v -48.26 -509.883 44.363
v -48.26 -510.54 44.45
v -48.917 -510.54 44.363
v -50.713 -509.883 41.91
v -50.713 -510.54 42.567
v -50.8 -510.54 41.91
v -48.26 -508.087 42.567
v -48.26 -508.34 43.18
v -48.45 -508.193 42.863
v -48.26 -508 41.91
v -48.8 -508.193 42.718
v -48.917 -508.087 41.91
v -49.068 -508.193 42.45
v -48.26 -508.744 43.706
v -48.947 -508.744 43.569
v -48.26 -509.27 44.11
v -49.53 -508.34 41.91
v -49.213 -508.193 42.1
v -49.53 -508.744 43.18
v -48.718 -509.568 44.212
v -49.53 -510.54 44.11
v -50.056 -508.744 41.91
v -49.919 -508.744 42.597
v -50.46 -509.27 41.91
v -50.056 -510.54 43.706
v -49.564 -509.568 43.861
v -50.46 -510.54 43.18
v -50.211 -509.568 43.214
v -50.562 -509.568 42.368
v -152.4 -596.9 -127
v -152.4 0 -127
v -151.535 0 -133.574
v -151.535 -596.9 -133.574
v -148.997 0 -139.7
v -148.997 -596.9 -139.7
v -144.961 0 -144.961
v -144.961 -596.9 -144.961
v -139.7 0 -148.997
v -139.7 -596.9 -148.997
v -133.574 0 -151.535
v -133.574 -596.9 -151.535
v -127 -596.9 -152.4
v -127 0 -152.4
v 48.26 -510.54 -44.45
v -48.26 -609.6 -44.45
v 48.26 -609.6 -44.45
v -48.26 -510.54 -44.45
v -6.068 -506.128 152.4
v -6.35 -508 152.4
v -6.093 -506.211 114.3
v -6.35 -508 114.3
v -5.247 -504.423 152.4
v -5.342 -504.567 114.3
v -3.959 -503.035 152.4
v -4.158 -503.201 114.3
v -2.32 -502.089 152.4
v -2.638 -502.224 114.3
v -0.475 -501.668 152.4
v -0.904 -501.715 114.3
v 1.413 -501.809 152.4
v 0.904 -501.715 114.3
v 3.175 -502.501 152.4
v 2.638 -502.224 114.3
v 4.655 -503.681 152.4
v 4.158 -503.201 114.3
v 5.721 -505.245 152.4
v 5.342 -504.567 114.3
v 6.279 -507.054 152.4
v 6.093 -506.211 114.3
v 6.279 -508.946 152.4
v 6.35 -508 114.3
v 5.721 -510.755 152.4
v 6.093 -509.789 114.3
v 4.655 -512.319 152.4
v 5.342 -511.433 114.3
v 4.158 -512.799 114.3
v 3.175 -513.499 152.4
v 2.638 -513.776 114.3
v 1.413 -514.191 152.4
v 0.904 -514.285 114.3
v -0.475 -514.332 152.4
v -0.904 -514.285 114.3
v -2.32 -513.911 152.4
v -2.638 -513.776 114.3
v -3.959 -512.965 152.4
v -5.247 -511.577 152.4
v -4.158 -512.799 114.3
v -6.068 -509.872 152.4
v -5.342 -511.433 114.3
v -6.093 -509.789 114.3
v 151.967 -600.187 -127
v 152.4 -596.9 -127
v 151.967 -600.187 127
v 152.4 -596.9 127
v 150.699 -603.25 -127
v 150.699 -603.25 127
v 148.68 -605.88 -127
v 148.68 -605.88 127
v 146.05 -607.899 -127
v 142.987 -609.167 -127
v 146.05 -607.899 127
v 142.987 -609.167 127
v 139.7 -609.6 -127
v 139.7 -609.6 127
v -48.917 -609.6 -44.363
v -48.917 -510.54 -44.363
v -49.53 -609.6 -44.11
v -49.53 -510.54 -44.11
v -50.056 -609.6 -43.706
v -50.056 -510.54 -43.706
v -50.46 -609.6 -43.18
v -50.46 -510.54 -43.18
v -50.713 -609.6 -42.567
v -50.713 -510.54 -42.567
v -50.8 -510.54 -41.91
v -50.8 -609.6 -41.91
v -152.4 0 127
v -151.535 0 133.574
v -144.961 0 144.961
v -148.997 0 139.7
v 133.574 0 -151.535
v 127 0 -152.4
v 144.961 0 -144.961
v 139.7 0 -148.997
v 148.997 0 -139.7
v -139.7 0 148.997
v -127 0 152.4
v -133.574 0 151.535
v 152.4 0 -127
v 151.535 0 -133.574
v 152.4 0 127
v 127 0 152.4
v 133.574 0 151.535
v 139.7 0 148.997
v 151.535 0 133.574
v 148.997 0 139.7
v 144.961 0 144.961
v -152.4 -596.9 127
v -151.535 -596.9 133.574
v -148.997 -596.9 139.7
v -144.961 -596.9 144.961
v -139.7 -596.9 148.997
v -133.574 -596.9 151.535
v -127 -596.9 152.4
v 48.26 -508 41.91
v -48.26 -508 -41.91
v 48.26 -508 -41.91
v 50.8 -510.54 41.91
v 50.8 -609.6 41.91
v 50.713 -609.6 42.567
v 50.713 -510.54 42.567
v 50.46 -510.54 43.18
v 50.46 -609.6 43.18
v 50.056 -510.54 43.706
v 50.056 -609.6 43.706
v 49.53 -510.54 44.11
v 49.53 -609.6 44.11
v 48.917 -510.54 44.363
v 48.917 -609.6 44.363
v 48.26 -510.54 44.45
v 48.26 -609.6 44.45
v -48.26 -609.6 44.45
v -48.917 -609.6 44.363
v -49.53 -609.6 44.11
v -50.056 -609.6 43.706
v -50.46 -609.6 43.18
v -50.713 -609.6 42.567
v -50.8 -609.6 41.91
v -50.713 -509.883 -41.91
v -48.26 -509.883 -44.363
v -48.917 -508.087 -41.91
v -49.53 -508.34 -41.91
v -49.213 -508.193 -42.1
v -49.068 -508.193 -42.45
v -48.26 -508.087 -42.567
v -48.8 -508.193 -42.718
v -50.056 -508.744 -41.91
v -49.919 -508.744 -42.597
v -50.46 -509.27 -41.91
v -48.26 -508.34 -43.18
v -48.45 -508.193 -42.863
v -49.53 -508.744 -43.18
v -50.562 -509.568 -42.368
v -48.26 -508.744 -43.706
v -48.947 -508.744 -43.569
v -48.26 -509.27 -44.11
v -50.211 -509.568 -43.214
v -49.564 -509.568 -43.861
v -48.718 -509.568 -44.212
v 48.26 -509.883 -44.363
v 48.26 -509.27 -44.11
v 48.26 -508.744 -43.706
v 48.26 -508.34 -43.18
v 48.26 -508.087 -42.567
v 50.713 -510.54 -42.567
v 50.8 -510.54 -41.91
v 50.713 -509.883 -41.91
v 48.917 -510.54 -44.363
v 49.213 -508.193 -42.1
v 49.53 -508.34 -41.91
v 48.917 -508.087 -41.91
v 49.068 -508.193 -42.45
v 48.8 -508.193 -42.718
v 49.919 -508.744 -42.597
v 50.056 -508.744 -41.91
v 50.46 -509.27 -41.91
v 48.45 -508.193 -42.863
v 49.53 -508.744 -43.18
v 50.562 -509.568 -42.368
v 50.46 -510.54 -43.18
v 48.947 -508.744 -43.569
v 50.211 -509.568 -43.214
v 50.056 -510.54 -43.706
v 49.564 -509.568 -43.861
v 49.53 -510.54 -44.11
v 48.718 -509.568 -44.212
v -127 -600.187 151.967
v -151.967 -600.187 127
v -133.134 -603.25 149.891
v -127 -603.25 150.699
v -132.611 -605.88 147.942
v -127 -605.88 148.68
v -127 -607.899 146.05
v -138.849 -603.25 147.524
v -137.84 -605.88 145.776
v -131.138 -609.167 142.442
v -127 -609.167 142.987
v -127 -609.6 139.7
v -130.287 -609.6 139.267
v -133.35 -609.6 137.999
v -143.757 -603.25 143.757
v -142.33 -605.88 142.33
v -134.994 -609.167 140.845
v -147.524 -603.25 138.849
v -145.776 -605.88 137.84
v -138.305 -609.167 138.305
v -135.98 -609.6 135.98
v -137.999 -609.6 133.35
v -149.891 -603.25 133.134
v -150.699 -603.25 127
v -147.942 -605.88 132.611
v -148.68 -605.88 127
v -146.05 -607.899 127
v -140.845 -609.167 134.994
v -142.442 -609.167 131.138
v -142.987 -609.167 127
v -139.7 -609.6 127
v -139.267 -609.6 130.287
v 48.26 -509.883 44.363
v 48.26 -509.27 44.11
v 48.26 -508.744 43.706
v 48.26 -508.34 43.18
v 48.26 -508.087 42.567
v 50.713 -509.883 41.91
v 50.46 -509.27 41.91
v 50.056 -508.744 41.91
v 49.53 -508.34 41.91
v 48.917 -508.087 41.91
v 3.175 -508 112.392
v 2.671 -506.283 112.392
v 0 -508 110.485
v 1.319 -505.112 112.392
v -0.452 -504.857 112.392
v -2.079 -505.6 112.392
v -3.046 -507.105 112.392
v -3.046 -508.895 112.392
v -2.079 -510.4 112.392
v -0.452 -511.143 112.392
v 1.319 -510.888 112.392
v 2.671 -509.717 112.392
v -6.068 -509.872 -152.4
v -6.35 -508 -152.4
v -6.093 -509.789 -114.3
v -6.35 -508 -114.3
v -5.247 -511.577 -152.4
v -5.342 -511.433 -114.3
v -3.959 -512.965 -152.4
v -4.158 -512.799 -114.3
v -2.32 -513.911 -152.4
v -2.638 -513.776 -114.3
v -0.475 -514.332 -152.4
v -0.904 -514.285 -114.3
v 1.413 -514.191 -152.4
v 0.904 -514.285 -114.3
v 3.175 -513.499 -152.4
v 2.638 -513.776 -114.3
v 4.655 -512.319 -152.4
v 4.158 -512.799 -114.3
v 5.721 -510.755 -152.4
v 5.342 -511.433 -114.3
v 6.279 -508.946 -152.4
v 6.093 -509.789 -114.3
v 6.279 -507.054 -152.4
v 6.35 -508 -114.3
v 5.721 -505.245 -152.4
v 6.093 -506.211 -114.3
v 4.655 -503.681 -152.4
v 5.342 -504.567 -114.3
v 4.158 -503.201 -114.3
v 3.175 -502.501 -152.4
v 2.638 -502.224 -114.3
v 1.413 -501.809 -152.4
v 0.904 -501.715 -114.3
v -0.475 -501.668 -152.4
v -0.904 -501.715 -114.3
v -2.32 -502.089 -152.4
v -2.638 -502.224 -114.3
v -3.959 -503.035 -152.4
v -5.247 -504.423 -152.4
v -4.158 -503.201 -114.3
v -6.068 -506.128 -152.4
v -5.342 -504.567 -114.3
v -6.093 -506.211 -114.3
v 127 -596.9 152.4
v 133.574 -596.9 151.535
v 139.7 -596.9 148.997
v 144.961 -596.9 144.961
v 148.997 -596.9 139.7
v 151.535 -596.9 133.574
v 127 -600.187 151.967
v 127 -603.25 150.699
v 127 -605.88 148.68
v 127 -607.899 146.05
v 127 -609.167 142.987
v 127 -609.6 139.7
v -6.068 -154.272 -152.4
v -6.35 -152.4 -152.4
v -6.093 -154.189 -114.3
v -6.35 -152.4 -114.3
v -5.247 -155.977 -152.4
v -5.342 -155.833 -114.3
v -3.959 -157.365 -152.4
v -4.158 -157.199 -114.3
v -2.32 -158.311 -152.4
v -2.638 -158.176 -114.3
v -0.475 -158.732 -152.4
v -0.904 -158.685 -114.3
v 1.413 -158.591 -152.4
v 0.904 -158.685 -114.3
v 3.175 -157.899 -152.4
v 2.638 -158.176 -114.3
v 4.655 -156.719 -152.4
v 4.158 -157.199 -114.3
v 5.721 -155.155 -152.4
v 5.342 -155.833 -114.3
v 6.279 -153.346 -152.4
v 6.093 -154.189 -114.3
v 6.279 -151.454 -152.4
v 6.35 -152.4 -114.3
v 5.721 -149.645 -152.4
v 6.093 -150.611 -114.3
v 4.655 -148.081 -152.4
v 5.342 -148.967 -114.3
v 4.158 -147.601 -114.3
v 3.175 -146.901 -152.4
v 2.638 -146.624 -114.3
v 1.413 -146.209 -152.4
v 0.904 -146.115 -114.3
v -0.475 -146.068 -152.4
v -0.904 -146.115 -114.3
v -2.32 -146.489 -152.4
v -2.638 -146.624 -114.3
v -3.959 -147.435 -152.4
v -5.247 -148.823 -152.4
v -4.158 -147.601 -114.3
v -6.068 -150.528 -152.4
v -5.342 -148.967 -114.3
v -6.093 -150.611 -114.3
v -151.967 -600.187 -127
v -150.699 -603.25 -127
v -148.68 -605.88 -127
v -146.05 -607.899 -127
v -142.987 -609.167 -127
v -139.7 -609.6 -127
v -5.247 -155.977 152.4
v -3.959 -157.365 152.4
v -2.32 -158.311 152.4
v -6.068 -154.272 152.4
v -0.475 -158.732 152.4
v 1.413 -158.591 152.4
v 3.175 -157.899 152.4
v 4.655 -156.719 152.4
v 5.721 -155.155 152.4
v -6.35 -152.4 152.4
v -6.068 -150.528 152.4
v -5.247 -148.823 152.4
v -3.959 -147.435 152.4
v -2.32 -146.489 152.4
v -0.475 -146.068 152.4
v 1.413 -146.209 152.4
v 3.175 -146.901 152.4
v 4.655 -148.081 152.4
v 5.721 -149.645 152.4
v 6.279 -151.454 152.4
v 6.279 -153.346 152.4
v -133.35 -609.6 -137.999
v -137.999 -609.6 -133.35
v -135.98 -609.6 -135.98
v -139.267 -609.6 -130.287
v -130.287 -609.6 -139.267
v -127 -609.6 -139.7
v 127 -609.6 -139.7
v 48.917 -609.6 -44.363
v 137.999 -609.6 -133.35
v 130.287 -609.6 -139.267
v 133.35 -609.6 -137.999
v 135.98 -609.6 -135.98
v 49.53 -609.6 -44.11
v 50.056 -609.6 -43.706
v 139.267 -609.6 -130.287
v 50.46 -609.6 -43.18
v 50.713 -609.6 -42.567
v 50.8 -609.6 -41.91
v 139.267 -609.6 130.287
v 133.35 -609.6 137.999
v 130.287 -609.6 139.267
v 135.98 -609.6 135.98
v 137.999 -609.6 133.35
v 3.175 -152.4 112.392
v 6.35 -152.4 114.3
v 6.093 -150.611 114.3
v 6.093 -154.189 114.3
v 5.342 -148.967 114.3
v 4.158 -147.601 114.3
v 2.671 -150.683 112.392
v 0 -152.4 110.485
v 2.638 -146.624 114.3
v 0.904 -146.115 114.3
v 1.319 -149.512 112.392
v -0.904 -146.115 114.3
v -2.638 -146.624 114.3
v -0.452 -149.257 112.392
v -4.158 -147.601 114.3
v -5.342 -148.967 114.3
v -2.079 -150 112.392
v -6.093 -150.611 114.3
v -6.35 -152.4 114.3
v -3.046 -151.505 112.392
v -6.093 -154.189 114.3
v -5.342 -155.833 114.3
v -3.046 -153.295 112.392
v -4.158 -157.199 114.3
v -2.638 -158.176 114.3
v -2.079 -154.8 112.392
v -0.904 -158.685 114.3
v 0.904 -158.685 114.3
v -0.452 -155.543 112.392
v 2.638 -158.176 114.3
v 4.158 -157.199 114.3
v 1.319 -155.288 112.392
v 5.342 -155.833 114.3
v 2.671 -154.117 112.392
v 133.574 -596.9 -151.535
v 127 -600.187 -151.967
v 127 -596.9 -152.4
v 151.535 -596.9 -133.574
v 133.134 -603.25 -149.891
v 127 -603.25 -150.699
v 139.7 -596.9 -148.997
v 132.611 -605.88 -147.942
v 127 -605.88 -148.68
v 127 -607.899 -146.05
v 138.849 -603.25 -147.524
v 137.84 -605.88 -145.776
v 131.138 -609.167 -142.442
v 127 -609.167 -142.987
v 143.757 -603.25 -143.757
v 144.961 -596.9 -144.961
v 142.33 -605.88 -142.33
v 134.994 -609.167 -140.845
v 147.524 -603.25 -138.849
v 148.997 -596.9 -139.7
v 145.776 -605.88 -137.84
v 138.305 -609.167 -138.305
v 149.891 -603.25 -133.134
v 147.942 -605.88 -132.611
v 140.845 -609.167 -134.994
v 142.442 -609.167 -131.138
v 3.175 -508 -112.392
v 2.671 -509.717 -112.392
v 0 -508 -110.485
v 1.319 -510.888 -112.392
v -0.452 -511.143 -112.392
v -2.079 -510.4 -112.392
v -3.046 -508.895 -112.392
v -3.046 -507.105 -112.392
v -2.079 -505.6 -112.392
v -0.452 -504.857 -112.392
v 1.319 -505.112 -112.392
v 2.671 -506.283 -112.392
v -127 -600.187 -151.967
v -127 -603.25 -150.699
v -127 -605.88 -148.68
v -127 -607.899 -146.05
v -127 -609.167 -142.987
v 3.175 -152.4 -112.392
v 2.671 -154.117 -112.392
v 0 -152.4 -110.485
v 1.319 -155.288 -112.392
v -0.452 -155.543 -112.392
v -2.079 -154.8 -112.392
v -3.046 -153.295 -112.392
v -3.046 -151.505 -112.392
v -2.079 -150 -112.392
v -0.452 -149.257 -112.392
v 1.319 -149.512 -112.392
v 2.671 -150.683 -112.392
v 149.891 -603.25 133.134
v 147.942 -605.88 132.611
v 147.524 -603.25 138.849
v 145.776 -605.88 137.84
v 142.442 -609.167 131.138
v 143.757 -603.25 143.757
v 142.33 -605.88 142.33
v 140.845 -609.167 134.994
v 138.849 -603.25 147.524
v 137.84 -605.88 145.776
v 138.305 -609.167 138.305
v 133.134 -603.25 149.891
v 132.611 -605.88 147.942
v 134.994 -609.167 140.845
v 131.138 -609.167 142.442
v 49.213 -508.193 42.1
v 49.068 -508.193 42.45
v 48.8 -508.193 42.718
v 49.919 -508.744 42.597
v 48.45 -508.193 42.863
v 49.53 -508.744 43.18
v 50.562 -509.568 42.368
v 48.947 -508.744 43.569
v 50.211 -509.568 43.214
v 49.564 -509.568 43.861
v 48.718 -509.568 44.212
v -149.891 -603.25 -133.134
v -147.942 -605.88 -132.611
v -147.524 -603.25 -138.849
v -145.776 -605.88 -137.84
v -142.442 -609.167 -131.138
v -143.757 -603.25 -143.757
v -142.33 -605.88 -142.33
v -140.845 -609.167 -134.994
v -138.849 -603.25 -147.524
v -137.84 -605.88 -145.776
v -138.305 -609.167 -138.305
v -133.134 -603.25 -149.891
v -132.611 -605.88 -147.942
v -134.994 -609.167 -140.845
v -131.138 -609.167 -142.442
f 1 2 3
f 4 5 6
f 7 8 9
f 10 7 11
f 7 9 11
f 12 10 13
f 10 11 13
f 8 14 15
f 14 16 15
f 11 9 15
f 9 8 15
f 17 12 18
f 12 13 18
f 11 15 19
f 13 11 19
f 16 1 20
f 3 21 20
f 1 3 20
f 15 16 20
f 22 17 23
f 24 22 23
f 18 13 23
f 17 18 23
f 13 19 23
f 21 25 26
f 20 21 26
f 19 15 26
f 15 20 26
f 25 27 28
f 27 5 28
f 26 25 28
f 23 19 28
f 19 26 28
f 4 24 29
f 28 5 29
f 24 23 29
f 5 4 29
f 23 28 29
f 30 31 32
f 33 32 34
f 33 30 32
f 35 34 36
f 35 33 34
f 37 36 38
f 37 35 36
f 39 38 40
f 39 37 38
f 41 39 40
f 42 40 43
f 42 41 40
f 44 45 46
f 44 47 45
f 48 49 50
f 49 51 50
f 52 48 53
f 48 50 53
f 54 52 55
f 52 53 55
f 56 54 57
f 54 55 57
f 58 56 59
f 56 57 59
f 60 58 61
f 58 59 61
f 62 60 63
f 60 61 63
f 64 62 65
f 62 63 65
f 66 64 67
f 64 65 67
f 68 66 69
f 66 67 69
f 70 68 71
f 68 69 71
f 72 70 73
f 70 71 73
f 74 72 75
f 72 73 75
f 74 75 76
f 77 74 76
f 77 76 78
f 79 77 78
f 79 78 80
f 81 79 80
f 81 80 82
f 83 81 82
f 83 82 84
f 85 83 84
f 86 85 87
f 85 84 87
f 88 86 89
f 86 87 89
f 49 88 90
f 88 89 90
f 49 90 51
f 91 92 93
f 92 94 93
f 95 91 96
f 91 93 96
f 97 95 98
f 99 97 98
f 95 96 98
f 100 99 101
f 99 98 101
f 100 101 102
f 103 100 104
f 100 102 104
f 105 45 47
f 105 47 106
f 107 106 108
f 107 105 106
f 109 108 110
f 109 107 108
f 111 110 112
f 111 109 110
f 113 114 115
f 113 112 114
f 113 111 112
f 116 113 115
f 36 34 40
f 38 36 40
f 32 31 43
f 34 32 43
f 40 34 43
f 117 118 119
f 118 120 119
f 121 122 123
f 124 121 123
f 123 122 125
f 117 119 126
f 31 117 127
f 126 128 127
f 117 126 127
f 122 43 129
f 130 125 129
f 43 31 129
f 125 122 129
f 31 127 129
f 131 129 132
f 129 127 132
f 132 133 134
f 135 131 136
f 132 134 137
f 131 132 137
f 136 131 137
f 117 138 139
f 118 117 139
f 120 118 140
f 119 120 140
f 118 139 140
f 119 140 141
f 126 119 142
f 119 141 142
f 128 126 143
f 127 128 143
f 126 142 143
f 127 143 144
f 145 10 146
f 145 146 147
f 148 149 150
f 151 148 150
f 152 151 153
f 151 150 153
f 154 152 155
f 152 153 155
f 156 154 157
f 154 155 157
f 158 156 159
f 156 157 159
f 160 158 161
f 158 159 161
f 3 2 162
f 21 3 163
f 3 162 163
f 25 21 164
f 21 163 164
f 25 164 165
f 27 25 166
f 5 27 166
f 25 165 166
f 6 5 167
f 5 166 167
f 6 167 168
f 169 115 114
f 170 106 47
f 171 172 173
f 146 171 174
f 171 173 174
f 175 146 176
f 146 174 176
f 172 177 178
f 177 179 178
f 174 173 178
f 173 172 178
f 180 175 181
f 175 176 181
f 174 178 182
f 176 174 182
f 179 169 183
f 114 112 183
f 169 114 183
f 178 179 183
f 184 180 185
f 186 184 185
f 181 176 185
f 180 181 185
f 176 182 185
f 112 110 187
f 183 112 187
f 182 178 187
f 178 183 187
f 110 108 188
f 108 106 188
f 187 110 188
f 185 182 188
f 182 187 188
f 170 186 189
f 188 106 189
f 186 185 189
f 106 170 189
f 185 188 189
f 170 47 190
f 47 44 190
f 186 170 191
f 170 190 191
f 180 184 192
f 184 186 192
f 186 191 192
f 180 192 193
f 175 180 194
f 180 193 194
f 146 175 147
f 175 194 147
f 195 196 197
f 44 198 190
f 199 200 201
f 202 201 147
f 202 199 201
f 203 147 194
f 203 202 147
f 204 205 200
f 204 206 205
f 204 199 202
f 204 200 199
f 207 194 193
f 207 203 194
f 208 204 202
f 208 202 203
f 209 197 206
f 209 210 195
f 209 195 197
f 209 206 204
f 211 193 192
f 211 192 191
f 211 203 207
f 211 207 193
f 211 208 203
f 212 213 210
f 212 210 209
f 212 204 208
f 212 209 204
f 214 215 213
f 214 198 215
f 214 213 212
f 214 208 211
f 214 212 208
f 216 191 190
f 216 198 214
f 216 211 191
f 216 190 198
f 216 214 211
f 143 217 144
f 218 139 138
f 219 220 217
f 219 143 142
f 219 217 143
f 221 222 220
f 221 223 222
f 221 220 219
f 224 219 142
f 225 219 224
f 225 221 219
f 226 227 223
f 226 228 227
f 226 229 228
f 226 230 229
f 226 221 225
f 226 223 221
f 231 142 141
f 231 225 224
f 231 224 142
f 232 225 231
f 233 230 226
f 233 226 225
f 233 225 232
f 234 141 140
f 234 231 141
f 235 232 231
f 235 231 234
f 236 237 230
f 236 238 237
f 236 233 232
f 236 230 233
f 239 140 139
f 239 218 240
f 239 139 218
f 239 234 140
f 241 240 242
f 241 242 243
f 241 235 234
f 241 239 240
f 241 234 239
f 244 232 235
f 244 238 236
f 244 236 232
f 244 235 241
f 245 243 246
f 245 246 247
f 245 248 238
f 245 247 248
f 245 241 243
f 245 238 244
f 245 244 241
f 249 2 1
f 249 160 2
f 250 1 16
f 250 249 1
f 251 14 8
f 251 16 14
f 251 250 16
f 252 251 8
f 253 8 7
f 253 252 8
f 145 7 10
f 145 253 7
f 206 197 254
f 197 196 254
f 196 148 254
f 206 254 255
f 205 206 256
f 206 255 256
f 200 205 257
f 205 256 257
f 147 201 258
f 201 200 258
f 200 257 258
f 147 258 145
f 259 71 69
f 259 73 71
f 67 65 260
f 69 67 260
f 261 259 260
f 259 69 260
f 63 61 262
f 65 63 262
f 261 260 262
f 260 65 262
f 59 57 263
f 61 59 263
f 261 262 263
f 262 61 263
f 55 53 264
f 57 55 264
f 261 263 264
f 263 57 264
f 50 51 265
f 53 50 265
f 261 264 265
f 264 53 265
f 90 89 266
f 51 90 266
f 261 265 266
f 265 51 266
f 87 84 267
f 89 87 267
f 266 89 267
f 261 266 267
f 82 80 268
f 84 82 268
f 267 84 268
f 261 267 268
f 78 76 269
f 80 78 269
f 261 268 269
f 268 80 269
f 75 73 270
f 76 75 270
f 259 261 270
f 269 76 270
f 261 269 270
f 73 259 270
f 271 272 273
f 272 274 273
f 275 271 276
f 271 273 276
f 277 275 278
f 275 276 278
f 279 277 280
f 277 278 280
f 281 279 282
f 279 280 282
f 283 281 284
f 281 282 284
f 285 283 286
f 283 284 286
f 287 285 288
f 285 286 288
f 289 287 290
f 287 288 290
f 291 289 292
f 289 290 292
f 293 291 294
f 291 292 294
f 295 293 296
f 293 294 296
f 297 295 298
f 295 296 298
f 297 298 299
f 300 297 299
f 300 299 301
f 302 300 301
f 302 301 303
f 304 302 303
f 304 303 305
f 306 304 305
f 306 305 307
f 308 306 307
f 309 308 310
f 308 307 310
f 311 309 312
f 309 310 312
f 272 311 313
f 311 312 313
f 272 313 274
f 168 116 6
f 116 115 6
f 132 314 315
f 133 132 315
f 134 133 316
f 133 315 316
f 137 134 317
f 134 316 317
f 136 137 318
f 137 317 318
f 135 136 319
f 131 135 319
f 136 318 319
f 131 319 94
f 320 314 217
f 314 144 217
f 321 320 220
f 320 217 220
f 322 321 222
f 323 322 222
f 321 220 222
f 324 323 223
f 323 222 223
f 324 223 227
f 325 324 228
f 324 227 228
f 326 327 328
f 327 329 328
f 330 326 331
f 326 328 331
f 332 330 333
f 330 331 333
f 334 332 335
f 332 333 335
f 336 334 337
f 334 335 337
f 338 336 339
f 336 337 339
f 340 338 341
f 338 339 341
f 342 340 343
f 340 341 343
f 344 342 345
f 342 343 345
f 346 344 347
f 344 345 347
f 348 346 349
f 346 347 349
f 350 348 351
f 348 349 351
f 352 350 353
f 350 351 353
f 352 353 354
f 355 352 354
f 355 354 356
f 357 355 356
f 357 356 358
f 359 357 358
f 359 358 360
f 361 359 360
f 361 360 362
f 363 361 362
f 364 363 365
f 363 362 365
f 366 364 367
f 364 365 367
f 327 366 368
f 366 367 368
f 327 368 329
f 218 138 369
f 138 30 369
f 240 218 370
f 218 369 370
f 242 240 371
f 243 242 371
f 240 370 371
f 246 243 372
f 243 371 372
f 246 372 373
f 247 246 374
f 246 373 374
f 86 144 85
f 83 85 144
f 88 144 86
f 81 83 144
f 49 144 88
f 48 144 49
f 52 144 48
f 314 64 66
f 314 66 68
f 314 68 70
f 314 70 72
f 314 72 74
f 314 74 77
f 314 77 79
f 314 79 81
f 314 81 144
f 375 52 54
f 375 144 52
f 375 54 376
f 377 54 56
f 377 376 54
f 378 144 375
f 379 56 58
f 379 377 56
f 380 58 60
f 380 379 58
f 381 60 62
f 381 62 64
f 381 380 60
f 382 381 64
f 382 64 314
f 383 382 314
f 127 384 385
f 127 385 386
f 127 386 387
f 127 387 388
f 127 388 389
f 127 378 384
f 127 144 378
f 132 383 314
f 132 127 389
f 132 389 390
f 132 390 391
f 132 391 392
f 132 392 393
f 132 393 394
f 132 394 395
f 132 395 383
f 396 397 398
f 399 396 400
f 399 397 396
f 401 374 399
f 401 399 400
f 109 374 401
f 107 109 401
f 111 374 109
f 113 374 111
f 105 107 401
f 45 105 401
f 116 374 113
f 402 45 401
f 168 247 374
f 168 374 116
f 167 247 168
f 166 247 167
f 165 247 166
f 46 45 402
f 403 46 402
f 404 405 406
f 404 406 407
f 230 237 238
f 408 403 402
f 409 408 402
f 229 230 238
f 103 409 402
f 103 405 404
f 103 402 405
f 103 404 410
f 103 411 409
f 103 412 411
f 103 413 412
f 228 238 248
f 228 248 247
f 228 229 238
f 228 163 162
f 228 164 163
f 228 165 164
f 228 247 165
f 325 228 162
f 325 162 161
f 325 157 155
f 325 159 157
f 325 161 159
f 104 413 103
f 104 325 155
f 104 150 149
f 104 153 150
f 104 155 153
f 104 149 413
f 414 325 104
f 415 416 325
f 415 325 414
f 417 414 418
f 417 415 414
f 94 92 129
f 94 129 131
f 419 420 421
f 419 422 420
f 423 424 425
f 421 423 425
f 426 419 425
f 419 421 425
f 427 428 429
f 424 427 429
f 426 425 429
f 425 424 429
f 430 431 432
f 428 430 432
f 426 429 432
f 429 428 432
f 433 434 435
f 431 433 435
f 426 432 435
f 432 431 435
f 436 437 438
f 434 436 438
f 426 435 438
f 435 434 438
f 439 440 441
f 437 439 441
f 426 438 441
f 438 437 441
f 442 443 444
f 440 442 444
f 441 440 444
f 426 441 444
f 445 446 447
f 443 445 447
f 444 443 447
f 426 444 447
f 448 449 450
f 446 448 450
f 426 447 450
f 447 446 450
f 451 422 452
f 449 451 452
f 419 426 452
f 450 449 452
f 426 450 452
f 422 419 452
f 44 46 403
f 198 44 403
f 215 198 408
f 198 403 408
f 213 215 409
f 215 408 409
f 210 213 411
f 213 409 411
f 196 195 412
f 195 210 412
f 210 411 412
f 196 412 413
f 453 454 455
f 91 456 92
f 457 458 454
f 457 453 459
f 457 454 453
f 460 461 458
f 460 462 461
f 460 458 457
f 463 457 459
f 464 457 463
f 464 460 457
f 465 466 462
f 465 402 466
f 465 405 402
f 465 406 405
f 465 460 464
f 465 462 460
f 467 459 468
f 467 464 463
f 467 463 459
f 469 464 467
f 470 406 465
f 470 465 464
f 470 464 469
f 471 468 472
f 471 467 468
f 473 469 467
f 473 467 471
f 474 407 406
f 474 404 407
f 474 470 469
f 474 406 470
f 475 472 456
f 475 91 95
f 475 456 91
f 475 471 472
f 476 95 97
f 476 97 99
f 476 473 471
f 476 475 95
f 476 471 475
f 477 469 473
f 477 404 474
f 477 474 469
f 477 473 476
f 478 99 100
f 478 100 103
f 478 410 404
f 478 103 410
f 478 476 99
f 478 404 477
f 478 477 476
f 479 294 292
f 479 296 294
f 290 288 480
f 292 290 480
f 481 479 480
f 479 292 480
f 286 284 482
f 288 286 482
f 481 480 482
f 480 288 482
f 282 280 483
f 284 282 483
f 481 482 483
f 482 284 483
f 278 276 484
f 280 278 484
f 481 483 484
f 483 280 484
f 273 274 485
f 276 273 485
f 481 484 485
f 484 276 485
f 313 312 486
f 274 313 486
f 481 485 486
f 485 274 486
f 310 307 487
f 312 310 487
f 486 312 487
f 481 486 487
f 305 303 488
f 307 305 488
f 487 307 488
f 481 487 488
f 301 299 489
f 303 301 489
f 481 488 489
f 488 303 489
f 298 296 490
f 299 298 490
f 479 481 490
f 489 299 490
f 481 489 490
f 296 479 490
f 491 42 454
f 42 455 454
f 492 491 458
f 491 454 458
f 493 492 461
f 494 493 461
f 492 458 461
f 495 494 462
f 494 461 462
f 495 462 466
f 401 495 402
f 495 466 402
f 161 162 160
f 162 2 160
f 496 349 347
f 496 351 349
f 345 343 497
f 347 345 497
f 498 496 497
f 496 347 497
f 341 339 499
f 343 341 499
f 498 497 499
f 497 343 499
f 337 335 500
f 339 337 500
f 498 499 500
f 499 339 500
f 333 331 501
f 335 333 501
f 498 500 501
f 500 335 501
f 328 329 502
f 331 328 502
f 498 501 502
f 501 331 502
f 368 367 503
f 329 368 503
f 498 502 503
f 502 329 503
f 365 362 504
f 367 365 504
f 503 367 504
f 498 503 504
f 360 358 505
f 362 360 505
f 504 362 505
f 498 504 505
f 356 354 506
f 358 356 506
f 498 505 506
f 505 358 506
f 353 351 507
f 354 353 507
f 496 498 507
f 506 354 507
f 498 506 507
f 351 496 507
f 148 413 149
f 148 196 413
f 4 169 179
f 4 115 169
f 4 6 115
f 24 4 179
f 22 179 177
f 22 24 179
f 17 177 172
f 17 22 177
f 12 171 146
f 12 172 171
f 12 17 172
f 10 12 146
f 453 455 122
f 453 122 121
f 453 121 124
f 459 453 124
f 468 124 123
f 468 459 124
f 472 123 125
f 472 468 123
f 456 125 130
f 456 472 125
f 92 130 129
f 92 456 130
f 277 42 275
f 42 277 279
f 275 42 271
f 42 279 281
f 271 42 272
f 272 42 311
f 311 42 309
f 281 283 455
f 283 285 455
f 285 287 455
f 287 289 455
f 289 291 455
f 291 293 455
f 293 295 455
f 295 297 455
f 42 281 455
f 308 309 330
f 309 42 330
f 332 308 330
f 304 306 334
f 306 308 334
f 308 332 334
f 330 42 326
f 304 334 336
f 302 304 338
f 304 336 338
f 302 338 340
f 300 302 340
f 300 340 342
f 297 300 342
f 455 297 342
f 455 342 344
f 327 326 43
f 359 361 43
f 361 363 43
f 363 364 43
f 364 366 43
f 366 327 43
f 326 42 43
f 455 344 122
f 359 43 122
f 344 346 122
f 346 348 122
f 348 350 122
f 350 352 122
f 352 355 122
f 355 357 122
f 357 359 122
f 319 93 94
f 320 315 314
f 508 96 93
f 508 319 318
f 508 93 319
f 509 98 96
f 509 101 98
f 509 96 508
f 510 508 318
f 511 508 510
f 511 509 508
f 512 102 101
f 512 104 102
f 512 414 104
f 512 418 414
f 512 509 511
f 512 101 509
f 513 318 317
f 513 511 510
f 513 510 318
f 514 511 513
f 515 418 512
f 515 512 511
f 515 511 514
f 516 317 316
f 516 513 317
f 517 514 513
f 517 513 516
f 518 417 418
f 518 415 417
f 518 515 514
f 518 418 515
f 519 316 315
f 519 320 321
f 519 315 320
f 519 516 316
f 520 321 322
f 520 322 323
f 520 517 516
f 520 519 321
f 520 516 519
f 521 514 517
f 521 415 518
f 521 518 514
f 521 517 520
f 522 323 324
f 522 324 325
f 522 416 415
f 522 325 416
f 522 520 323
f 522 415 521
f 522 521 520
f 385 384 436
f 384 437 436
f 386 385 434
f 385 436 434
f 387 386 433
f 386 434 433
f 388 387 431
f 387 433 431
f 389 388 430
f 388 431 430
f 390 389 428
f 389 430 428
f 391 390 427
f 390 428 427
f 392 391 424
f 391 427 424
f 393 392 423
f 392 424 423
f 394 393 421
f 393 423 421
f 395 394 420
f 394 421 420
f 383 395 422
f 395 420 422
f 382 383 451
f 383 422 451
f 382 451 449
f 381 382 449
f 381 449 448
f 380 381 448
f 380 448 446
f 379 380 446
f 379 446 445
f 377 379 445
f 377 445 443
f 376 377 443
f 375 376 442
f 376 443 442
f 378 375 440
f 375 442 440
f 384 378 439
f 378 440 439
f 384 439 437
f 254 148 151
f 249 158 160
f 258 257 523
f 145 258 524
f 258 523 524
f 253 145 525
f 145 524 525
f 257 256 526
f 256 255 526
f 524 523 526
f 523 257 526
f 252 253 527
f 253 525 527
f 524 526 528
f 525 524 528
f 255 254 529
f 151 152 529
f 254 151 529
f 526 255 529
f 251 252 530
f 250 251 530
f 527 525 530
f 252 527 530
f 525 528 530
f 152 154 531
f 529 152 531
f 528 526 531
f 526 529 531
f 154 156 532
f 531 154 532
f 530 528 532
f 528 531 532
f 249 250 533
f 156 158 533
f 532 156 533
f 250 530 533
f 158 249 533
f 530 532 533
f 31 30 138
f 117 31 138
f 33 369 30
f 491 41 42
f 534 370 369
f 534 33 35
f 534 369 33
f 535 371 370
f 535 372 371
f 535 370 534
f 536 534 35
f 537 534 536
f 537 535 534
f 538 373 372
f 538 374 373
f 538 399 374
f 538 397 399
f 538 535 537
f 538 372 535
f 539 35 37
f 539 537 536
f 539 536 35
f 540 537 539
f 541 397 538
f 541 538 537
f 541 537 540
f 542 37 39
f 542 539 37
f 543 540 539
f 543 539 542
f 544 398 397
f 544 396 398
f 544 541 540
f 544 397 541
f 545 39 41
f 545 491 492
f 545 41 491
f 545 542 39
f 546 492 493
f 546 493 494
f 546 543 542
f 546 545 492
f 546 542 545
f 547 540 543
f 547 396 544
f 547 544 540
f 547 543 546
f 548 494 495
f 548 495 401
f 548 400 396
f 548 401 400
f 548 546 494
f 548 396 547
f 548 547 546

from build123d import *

# Parameters (mm, degrees)
F0_W     = 304.8
F0_H     = 304.8
F0_W_2   = 101.6
F0_H_2   = 88.9
F1_DEPTH = 609.6
F8_DEPTH = 508
F2_R     = 25.4
F3_R     = 12.7
F4_D     = 12.7
F4_DEPTH = 38.1
F4_TIP   = 3.8154649308
F6_D     = 12.7
F6_DEPTH = 38.1
F6_TIP   = 3.8154649308
F7_R     = 2.54


# Not quite as in the source:
# - a feature names something its author has since deleted; it is built from what else it names


with BuildPart() as f1:
    # F0 (on Front) → F1 (new body)
    with BuildSketch(Plane.XZ):
        Rectangle(F0_W, F0_H)
        Rectangle(F0_W_2, F0_H_2, mode=Mode.SUBTRACT)
    extrude(amount=F1_DEPTH)

    # F0 (on Front) → F8 (join)
    with BuildSketch(Plane.XZ):
        Rectangle(F0_W_2, F0_H_2)
    extrude(amount=F8_DEPTH)

    # F2
    f2_edges = [f1.edges().sort_by_distance(p)[0] for p in [
        (152.4, -304.8, -152.4),
        (-152.4, -304.8, -152.4),
        (-152.4, -304.8, 152.4),
        (152.4, -304.8, 152.4),
    ]]
    fillet(f2_edges, radius=F2_R)

    # F3
    f3_edges = [f1.edges().sort_by_distance(p)[0] for p in [
        (152.4, -609.6, 0),
    ]]
    fillet(f3_edges, radius=F3_R)

    # F4
    with Locations(Plane(origin=(0, 0, -152.4), x_dir=(1, 0, 0), z_dir=(0, 0, -1))):
        with Locations((0, 152.4), (0, 508)):
            Hole(F4_D / 2, depth=F4_DEPTH)
            with Locations((0, 0, -(F4_DEPTH + F4_TIP / 2))):  # 118° drill point
                Cone(0, F4_D / 2, F4_TIP, mode=Mode.SUBTRACT)

    # F6
    with Locations(Plane.XY.offset(152.4)):
        with Locations((0, -508), (0, -152.4)):
            Hole(F6_D / 2, depth=F6_DEPTH)
            with Locations((0, 0, -(F6_DEPTH + F6_TIP / 2))):  # 118° drill point
                Cone(0, F6_D / 2, F6_TIP, mode=Mode.SUBTRACT)

    # F7
    f7_edges = [f1.edges().sort_by_distance(p)[0] for p in [
        (-50.8, -558.8, -44.45),
        (-50.8, -558.8, 44.45),
        (50.8, -558.8, 44.45),
        (50.8, -558.8, -44.45),
        (50.8, -508, 0),
        (0, -508, 44.45),
        (-50.8, -508, 0),
        (0, -508, -44.45),
    ]]
    fillet(f7_edges, radius=F7_R)


solid = f1.part
